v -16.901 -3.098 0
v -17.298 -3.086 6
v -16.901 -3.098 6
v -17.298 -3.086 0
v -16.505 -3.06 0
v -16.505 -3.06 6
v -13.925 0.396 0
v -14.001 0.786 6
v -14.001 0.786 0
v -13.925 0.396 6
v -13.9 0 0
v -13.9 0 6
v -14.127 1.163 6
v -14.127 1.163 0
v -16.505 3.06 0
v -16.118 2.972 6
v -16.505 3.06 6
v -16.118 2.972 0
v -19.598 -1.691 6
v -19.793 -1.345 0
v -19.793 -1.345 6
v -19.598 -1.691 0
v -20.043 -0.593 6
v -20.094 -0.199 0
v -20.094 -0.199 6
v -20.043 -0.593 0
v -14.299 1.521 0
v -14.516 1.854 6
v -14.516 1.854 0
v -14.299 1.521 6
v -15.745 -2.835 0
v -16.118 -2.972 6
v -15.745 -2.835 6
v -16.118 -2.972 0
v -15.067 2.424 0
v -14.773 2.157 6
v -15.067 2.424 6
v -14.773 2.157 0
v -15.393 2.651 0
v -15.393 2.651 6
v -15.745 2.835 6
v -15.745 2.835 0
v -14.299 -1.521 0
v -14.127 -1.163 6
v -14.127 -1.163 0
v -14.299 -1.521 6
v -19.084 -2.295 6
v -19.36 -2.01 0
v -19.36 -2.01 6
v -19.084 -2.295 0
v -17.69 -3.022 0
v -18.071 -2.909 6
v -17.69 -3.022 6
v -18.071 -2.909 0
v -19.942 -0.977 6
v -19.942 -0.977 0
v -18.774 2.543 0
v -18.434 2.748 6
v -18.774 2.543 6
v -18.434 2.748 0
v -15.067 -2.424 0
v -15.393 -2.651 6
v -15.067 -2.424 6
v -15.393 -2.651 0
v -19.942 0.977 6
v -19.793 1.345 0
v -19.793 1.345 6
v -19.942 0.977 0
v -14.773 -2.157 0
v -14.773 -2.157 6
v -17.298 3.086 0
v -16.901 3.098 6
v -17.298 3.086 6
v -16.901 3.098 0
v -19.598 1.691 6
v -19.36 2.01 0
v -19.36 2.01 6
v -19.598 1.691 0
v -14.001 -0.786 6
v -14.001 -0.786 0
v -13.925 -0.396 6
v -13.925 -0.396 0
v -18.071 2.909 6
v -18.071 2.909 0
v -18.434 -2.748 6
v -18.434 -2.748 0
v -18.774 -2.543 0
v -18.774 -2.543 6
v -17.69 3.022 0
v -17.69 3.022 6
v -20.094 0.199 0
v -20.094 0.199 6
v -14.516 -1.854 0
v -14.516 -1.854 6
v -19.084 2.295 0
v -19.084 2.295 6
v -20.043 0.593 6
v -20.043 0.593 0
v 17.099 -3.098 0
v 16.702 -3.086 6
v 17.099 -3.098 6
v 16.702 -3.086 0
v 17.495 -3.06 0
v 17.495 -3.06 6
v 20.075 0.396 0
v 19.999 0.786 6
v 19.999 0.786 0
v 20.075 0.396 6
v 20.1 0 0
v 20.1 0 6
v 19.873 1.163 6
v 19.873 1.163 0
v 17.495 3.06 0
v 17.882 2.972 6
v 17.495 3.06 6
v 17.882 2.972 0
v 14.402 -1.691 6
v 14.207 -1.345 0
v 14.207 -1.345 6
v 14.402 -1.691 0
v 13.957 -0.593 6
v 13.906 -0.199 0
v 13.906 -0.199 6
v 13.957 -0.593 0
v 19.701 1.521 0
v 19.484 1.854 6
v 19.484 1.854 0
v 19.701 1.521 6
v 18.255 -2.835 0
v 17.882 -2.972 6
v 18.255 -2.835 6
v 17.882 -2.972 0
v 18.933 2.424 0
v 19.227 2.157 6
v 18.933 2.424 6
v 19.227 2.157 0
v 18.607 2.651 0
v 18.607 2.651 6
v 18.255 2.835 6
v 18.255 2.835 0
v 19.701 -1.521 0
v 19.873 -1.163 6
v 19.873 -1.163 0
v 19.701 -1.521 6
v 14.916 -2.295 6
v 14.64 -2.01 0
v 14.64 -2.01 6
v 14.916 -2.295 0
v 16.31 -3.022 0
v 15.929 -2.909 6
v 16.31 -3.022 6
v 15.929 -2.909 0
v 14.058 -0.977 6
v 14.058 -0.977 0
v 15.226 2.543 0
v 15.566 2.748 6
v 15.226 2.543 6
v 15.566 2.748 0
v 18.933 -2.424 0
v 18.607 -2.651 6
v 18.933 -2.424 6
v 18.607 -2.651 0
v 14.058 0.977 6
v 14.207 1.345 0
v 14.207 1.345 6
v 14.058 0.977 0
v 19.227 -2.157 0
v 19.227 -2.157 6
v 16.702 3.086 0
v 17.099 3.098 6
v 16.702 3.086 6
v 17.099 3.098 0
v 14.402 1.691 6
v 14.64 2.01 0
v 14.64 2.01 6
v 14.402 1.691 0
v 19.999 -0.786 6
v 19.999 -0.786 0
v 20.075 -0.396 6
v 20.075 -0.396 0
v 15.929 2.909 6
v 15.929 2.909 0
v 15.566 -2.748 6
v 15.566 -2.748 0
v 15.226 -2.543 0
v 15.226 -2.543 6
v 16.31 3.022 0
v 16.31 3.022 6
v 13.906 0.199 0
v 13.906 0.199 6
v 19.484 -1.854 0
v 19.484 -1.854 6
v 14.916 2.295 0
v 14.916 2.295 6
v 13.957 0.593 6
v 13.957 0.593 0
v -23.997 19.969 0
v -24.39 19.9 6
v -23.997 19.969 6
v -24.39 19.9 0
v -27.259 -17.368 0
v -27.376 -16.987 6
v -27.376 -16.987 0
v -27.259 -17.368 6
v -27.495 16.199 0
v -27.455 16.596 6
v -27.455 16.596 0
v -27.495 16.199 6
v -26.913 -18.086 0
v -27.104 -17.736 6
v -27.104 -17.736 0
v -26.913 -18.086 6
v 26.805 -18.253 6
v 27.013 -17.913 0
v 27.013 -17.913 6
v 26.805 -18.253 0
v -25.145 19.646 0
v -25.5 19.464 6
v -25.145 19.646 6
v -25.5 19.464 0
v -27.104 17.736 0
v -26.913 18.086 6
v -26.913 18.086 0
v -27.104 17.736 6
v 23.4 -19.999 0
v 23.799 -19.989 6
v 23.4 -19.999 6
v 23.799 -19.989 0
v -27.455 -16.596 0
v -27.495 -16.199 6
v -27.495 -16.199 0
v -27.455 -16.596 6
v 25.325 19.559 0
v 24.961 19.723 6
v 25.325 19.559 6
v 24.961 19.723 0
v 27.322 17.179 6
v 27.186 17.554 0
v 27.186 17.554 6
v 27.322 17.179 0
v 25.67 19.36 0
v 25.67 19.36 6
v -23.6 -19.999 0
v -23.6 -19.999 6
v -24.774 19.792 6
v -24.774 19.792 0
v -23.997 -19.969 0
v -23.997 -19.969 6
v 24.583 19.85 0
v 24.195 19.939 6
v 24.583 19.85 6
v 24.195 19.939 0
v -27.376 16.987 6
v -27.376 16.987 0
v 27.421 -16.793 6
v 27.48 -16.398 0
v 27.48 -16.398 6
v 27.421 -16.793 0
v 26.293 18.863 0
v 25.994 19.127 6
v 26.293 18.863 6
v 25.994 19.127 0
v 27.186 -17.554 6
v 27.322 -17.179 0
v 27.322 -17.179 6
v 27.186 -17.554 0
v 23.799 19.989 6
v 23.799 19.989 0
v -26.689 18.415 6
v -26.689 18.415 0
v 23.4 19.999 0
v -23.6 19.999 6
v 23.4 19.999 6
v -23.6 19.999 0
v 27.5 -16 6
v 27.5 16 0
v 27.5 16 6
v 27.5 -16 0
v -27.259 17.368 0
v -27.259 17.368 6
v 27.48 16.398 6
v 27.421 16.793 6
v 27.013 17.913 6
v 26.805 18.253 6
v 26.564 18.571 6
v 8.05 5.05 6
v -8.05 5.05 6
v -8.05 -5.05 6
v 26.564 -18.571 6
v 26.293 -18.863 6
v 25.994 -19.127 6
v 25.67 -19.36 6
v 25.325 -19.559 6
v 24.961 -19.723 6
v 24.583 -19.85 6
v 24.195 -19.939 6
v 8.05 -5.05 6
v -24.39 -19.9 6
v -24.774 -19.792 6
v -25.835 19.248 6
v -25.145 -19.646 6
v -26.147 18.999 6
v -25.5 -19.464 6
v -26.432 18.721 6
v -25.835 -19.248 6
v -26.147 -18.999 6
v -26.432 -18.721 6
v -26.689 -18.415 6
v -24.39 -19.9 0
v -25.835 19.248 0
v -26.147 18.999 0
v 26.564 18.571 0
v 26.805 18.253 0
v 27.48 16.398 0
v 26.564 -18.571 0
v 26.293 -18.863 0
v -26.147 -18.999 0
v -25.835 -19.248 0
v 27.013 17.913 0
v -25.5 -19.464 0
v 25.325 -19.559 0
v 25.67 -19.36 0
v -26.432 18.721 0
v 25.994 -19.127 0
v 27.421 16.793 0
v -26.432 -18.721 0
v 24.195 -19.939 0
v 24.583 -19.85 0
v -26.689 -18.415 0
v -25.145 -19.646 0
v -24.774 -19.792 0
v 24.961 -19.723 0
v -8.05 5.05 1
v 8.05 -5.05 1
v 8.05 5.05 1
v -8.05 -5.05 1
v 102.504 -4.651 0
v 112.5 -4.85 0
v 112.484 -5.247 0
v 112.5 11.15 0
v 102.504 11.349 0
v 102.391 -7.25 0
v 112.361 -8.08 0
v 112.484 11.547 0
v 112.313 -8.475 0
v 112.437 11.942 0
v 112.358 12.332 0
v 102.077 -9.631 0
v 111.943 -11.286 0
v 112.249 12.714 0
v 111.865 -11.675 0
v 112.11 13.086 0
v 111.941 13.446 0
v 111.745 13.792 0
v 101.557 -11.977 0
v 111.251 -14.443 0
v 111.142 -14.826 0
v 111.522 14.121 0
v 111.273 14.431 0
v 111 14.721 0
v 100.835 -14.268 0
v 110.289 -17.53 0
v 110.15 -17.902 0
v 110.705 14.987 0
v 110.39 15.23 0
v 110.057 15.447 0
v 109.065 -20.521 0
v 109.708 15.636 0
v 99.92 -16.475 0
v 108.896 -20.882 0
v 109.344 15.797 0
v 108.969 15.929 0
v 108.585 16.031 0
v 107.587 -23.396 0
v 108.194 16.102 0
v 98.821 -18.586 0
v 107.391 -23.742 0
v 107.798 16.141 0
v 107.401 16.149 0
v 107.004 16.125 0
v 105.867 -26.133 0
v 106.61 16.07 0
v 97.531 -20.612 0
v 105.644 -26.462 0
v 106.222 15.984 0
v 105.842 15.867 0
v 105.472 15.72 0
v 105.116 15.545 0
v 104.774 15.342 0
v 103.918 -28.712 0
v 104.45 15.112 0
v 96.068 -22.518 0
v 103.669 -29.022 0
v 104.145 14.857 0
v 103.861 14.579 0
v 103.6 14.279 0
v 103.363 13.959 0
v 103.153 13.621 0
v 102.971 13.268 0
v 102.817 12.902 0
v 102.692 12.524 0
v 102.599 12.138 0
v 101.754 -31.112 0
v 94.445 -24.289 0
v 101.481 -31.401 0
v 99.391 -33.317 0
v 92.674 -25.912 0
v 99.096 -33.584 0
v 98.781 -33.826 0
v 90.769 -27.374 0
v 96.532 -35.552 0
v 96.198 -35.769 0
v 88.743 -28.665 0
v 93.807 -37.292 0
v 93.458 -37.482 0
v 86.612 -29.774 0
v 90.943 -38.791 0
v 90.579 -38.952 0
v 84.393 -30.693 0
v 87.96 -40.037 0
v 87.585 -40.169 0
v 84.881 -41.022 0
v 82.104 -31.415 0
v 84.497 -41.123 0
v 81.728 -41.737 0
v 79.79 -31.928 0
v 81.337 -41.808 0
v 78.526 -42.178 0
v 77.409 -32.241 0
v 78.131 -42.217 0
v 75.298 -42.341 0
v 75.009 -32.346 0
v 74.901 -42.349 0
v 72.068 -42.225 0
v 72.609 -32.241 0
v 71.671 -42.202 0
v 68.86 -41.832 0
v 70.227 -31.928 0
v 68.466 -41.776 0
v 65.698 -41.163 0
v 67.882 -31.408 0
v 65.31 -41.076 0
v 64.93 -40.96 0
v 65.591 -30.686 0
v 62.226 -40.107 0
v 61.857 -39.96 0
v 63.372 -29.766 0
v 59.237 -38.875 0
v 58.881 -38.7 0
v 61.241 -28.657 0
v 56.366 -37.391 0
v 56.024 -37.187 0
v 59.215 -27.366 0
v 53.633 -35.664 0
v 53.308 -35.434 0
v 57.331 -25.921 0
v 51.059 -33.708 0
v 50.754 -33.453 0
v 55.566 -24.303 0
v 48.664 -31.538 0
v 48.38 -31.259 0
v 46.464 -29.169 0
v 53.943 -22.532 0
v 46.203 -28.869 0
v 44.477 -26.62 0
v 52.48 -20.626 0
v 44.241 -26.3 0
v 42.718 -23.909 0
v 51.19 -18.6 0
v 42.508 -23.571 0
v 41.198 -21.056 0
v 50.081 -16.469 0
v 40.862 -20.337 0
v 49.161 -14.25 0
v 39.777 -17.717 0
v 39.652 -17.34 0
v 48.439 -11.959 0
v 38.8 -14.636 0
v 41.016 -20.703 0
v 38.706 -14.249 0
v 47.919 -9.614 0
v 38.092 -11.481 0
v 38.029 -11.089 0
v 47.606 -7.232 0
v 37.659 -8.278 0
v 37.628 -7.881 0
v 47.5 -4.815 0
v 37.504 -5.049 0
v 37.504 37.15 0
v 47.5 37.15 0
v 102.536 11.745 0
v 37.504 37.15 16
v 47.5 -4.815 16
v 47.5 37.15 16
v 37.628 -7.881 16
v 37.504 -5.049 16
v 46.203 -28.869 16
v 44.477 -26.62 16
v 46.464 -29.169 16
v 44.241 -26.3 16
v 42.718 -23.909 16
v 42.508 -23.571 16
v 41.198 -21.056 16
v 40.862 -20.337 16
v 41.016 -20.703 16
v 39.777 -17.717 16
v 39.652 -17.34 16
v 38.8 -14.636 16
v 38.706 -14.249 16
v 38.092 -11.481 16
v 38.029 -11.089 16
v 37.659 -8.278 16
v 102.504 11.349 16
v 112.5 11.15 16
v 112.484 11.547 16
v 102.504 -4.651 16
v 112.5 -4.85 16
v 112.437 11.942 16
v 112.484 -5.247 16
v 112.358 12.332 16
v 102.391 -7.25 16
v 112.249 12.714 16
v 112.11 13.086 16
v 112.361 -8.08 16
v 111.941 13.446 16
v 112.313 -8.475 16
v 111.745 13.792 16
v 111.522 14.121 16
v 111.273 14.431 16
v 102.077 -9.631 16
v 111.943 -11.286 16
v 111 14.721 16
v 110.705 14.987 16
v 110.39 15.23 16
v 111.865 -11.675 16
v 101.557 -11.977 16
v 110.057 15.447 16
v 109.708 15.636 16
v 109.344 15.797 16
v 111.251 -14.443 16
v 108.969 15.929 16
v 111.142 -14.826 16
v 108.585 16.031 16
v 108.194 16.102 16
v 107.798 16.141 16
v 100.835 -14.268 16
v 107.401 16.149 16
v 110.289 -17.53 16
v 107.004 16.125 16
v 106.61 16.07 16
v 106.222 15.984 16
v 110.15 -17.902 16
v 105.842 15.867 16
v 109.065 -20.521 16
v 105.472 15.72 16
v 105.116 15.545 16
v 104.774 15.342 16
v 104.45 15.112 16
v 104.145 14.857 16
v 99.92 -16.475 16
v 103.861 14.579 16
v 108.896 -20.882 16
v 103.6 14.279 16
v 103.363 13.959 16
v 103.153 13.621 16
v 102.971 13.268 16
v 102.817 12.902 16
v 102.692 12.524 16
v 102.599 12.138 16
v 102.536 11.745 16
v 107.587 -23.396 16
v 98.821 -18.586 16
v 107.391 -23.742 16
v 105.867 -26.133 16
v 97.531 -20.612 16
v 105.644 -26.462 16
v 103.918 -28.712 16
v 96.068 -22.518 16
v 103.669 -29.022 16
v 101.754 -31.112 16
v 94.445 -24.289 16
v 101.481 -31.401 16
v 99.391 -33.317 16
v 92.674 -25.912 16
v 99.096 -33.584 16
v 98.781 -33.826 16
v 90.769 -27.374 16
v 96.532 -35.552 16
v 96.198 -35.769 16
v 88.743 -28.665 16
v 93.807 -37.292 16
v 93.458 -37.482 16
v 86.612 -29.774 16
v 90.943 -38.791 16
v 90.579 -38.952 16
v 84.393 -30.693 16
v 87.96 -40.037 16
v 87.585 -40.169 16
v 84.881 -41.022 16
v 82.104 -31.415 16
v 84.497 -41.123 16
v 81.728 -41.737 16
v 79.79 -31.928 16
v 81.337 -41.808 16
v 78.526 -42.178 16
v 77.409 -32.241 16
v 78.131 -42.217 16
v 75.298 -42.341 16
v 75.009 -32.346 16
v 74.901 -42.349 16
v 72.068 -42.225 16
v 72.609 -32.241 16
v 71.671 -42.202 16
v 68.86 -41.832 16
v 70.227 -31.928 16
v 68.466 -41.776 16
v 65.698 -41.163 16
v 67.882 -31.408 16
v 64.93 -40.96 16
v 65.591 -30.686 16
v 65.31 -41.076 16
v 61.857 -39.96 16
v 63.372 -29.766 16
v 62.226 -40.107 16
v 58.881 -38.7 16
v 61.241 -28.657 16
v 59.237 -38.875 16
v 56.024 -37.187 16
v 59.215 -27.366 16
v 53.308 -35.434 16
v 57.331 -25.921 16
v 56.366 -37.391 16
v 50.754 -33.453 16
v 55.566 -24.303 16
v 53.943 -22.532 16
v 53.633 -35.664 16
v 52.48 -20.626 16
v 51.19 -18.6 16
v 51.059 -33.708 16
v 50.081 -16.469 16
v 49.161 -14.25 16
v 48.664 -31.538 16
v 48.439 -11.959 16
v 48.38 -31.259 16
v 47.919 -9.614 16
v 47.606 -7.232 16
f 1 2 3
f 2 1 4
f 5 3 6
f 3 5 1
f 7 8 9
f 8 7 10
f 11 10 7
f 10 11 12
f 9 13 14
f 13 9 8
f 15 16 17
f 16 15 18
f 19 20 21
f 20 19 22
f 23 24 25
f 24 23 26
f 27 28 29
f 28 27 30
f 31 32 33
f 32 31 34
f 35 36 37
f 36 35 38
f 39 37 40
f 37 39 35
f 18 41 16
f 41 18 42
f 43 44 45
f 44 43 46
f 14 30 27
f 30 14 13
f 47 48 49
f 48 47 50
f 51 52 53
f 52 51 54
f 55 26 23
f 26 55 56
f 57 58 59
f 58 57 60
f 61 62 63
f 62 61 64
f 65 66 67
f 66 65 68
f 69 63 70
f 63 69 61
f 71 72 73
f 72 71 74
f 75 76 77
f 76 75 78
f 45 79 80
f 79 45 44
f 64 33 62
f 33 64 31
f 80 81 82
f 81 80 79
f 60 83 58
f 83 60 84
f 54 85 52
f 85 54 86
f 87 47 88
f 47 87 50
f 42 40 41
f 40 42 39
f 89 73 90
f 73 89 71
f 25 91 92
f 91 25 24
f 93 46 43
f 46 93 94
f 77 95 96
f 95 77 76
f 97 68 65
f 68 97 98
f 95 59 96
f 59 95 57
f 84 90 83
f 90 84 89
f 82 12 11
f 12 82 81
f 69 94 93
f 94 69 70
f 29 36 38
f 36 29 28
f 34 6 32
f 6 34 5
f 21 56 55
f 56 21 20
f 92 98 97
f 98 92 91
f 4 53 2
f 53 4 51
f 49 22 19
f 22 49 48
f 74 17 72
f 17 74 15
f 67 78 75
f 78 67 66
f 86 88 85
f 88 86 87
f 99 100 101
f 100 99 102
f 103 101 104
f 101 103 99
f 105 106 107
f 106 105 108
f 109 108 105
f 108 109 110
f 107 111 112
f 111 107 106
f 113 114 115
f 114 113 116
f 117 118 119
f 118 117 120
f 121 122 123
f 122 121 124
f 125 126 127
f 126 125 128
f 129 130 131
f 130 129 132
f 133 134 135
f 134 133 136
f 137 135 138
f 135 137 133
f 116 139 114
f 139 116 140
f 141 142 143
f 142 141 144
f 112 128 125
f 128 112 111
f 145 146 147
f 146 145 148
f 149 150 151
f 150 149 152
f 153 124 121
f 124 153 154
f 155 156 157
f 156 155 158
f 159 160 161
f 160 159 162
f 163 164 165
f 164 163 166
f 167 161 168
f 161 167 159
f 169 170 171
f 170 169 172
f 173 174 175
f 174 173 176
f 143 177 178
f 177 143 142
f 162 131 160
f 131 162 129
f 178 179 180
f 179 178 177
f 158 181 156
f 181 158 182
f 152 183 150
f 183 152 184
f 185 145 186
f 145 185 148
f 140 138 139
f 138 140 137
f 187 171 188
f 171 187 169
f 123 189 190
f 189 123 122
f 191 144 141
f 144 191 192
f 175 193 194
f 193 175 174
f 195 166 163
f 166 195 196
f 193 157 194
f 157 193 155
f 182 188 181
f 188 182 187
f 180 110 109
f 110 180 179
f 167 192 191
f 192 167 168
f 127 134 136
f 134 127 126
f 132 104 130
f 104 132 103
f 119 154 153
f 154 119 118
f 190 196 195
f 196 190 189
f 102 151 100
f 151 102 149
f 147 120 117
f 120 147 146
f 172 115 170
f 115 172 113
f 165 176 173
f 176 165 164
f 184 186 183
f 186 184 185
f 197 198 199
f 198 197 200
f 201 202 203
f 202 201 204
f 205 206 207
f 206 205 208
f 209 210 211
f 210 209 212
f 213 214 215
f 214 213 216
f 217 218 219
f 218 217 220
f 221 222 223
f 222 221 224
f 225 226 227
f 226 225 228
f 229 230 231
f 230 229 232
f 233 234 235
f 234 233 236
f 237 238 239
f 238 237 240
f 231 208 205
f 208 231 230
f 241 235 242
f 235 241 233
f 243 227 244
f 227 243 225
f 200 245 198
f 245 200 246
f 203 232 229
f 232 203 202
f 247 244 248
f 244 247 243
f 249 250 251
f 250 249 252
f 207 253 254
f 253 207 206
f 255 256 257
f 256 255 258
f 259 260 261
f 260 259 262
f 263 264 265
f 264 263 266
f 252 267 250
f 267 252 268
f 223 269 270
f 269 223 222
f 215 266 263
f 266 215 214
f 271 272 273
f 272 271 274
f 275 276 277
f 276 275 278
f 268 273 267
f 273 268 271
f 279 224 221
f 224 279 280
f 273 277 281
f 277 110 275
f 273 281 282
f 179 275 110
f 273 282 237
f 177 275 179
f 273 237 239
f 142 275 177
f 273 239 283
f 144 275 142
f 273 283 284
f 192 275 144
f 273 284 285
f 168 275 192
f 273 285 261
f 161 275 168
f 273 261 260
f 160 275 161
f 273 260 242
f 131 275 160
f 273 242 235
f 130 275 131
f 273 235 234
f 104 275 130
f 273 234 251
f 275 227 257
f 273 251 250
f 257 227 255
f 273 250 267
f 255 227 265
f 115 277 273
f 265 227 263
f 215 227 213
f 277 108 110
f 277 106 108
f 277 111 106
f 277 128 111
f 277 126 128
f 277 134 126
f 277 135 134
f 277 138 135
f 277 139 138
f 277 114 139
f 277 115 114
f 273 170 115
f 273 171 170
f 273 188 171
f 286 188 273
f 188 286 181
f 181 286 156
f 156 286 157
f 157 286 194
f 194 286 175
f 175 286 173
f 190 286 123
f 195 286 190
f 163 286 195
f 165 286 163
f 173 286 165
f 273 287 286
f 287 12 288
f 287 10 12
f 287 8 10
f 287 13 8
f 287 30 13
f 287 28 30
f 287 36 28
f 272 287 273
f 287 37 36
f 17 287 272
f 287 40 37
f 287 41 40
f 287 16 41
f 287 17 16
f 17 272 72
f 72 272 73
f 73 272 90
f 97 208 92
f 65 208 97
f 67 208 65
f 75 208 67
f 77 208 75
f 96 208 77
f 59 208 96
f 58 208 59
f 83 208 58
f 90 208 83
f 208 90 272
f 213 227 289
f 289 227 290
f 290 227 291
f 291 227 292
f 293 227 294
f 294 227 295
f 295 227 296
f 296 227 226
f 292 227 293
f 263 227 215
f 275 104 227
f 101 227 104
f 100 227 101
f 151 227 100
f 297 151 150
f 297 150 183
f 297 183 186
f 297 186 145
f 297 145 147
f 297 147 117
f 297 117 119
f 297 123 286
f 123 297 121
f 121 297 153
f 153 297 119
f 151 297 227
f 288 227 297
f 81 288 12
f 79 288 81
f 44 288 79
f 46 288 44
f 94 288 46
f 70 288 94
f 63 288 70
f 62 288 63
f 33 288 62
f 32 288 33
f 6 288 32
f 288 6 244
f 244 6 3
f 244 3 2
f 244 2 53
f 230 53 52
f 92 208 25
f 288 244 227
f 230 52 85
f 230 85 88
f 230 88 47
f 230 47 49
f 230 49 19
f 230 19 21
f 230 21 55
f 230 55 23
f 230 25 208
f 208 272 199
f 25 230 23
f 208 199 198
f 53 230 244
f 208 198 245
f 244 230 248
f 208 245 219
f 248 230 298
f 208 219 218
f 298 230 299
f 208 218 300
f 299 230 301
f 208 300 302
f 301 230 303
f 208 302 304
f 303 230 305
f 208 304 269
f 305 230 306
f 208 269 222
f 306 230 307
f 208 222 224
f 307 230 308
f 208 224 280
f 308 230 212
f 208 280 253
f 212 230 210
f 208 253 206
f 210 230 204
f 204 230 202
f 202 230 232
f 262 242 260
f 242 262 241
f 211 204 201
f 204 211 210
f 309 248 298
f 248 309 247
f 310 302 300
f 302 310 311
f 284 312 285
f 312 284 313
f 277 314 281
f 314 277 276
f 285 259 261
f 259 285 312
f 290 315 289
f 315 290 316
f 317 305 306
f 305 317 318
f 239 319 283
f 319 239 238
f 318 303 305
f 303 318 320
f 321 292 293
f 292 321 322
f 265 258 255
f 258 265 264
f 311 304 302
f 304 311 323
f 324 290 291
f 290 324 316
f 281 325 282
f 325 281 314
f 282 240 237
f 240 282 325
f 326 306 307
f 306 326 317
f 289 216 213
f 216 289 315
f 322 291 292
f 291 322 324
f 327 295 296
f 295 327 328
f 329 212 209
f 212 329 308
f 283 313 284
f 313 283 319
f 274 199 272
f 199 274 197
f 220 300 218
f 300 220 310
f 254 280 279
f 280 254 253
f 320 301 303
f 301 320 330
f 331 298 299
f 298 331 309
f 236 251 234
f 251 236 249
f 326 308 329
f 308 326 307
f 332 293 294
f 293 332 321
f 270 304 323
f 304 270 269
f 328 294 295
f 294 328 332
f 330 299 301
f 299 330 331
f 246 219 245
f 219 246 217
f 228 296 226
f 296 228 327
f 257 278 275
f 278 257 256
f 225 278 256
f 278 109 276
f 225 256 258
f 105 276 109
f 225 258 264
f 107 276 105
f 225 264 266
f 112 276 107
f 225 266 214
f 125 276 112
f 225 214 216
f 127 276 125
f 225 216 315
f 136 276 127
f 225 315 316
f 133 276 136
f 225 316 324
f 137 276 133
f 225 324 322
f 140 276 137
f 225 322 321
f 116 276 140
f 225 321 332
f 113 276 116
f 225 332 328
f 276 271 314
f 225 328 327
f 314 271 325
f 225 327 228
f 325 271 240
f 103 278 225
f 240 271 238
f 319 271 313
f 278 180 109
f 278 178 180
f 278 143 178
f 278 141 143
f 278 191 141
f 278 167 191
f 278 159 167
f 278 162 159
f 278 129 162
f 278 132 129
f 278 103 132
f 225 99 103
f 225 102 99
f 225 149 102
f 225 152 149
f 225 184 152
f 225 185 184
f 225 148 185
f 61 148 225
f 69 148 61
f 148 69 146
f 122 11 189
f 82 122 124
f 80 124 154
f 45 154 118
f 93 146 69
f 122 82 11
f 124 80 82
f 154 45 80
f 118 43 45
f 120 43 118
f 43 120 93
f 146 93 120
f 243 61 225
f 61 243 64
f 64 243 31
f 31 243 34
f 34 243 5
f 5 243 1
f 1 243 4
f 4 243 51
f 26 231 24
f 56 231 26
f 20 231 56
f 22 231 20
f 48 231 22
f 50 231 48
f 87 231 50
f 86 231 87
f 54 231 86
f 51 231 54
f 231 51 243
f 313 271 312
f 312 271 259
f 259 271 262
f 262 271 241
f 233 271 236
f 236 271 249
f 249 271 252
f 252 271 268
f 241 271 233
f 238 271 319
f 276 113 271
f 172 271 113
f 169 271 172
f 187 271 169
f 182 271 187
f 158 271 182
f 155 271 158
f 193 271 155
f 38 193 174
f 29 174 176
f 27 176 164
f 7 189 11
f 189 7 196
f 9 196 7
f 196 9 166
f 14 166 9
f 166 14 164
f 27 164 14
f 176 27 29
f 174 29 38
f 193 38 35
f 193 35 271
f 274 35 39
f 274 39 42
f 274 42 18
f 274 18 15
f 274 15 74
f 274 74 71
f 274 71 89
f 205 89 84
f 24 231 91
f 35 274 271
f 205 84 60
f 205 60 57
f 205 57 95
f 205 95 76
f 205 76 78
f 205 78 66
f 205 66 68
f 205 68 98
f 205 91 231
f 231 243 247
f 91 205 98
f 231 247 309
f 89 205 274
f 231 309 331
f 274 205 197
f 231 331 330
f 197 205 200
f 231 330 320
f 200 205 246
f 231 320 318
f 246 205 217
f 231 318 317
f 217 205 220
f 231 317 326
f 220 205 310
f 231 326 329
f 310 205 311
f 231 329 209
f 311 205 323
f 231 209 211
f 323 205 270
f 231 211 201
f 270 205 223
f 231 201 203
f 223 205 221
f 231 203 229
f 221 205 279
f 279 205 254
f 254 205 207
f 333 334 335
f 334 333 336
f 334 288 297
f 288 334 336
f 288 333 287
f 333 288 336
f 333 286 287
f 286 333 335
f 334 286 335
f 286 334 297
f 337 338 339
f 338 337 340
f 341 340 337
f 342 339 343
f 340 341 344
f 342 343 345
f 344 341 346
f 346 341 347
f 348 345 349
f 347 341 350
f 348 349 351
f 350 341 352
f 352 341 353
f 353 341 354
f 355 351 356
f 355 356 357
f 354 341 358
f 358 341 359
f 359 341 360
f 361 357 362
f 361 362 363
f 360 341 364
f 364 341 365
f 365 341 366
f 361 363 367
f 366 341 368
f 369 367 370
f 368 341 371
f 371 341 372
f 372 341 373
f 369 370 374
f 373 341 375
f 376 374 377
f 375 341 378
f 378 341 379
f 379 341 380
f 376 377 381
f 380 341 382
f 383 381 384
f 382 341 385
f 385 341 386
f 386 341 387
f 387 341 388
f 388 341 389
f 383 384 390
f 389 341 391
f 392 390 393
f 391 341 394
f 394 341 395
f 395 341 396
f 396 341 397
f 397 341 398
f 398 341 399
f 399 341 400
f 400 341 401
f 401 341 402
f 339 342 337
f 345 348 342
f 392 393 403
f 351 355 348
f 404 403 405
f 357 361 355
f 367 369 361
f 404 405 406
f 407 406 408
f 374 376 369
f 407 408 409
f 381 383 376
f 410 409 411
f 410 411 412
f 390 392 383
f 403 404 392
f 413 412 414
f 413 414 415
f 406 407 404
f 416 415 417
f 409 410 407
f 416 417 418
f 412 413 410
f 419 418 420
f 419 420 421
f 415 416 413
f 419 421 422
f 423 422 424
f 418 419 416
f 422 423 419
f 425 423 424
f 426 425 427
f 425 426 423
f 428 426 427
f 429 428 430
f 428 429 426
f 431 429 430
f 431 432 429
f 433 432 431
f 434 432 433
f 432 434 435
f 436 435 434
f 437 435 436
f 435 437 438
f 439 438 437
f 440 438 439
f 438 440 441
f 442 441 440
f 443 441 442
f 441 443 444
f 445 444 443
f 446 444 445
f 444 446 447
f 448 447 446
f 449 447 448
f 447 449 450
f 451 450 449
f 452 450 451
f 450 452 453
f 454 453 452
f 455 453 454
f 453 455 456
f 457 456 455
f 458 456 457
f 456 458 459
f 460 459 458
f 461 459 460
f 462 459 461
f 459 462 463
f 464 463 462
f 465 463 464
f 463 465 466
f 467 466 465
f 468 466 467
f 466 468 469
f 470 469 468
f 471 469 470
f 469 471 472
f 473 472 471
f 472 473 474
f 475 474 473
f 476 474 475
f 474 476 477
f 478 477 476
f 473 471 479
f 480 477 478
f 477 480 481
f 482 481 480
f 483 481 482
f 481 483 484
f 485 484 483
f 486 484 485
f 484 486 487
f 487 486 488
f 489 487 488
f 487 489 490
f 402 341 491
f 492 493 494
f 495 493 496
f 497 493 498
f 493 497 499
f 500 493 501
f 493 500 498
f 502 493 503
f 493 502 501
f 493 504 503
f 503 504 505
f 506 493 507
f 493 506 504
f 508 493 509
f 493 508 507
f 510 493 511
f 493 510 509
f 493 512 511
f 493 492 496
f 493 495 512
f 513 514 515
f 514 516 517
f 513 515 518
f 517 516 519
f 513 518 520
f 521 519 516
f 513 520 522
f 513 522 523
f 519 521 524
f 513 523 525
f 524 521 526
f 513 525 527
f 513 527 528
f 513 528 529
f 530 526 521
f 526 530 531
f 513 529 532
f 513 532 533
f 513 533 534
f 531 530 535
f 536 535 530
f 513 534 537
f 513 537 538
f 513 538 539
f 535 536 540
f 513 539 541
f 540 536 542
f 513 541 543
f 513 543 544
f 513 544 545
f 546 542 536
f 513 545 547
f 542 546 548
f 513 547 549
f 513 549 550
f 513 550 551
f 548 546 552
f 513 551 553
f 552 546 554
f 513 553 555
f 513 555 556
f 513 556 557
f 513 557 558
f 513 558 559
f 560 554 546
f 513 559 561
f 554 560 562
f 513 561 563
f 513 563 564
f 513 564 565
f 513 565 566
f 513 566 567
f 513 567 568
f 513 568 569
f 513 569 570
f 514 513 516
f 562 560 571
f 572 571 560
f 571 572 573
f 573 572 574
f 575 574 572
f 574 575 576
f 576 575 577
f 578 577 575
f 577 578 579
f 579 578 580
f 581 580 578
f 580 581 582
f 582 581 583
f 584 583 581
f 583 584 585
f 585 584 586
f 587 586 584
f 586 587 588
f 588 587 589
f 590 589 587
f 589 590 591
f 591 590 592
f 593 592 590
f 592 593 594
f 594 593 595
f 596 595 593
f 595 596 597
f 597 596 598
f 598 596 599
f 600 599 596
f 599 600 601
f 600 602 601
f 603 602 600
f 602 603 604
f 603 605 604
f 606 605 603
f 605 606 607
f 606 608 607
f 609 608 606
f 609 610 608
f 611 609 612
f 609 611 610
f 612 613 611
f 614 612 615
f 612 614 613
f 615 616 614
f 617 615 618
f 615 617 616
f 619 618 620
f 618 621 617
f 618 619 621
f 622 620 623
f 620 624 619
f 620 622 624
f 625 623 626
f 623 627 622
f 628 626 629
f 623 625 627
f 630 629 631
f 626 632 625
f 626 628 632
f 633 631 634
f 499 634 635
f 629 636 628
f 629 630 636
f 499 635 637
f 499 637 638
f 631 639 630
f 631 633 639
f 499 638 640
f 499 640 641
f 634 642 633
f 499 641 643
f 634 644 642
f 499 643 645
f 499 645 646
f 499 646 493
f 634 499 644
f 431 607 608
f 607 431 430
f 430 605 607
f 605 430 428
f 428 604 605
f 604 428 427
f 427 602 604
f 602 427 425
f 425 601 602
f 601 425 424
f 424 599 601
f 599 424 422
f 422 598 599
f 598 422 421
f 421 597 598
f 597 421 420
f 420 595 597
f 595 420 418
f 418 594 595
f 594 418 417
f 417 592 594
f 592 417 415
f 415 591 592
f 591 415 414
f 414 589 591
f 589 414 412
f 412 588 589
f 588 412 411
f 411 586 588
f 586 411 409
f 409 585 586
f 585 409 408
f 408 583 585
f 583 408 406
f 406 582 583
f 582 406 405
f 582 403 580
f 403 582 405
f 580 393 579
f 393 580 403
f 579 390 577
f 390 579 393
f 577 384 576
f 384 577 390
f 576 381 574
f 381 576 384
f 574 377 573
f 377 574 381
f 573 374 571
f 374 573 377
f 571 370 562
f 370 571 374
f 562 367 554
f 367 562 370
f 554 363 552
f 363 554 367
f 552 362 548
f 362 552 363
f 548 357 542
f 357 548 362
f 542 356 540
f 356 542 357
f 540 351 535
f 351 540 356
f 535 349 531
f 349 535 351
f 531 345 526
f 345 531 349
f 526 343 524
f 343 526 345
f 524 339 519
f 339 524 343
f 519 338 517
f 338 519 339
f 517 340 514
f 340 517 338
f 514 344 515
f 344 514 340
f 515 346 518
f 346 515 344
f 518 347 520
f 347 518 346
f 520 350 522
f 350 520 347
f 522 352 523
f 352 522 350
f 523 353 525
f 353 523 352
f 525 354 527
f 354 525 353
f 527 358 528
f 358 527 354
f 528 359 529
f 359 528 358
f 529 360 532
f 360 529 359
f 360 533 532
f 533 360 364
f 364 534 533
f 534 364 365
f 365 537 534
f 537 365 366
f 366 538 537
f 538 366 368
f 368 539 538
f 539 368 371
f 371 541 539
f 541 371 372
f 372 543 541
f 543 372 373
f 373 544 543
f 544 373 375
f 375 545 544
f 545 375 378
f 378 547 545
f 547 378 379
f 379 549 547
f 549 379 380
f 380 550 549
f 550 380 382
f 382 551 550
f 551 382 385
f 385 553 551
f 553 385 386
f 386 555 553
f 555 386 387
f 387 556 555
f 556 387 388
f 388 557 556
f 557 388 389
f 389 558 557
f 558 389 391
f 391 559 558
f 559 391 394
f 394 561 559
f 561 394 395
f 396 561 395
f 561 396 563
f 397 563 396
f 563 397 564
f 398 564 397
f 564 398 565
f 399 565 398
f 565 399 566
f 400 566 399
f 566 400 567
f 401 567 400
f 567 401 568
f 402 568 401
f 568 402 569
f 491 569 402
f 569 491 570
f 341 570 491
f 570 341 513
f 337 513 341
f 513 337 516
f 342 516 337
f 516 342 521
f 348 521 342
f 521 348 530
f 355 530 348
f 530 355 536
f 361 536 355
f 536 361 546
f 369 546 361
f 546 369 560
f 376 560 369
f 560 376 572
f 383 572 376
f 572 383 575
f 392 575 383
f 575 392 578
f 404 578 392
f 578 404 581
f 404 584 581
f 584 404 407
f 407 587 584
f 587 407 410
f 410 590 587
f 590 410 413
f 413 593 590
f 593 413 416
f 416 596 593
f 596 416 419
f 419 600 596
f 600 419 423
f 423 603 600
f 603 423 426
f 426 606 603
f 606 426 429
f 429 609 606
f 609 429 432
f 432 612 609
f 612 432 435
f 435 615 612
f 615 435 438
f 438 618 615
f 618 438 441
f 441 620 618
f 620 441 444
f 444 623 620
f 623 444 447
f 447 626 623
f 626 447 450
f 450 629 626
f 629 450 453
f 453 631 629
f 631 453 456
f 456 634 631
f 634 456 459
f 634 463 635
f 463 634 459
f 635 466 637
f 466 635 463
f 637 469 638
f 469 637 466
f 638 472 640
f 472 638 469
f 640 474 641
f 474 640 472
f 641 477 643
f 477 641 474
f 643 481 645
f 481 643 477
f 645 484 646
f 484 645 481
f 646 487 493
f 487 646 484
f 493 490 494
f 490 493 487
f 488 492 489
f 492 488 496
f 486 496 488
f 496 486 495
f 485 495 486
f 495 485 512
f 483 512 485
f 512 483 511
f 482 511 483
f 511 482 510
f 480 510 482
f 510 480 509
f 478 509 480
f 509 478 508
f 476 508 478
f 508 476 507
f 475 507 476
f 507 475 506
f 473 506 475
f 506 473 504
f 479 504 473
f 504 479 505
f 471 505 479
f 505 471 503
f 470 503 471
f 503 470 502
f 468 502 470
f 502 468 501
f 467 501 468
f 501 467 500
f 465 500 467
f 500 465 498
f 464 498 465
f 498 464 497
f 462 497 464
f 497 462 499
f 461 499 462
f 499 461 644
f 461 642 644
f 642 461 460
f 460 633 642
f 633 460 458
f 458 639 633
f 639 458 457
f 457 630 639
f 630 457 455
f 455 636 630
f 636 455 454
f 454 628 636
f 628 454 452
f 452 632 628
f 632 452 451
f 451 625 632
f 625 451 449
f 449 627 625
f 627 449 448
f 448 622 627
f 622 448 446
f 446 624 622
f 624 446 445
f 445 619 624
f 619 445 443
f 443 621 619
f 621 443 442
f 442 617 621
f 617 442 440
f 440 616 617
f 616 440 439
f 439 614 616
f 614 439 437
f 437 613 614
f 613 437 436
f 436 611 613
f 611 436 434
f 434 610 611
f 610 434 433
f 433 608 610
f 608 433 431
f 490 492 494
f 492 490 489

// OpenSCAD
// ============================================================
// Garage Hook — Underside-Beam J-Hook (Split for Printing)
//
// A classic J-hook that screws into the underside of a wooden
// beam (e.g. 2×3 nominal, ~40 mm face).  Two pan-head self-
// tapping screws go through the base plate into the wood.
// Lightweight garage items hang on the deep J curve.
//
// The model is split into two glue-together parts so both
// print support-free:
//   BASE  — plate with a socket pocket; prints flat on the bed.
//   HOOK  — J-curve with a tenon; prints on its side.
//
// Coordinate system:
//   X = along the beam (base plate length direction)
//   Y = across the beam width (hook width direction)
//   Z = down from the beam underside (positive = downward)
//
// All units: millimeters.
// ============================================================

/* [Hook Shape] */
straight_down          = 42;    // Vertical back section length
arc_radius             = 32.5;    // Centerline radius of the 180° bottom curve
straight_up            = 16;    // Vertical front lip length (tip sits 10 mm below base)
band_thickness         = 10;    // Hook body thickness in profile plane
hook_width             = 16;    // Hook body width along Y (across beam)
arc_steps              = 36;    // Number of segments for the bottom curve

/* [Mounting Plate] */
plate_length           = 55;    // X — along the beam
plate_width            = 40;    // Y — across the beam (matches ~40 mm beam face)
plate_thickness        = 6;     // Z — plate height

/* [Screw Holes] */
screw_diameter         = 6.2;   // Clearance for 5 mm self-tapping screws
screw_spacing          = 34;    // Center-to-center along X
hole_overage           = 0.4;   // Extra drill-through beyond plate thickness

/* [Split Joint] */
socket_depth           = 5;     // Depth of the socket pocket in the base plate
socket_clearance       = 0.05;  // Radial clearance for glue (per side)
socket_bottom_gap      = 0.2;   // Extra socket depth so the tenon tip clears
print_spacing          = 10;    // Minimum gap between parts on the print bed

/* [Reinforcement] */
root_fillet_radius     = 5;     // Fillet radius at the hook-back-to-plate junction

/* [View] */
export_mode            = "print"; // assembly | print | base | hook

/* [Quality] */
$fa                    = 1;
$fs                    = 0.4;

// ============================================================
// DERIVED
// ============================================================

band_radius            = band_thickness / 2;
half_hook_width        = hook_width / 2;
half_plate_length      = plate_length / 2;
half_plate_width       = plate_width / 2;

// Arc geometry — 180° sweep clockwise from left (180°) through
// bottom (270°) to right (360° ≡ 0°).
arc_center             = [arc_radius, -straight_down];
arc_start_angle        = 180;
arc_end_angle          = 360;

// Key profile points
tip_z                  = -straight_down + straight_up;  // ~ -10
front_x                = 2 * arc_radius;                 // 42 — X of the front lip

// Screw positions on the plate (XZ plane, plate sits at Z=0)
screw_half_spacing     = screw_spacing / 2;

// Socket / tenon derived dimensions (square, no corner rounding)
socket_w               = band_thickness + 2 * socket_clearance;
socket_d               = hook_width     + 2 * socket_clearance;

// Print-layout placement helpers (offsets from the base origin)
// Hook profile X span ≈ band_radius … (front_x + band_radius)  →  −5 … 70
hook_print_x           = half_plate_length + print_spacing + band_radius;
// Hook Y span after rotation ≈ −(socket_depth+socket_bottom_gap) … (straight_down+arc_radius+band_radius)
hook_print_y           = (straight_down + arc_radius + band_radius
                           - socket_depth - socket_bottom_gap) / 2;

// ============================================================
// HELPERS
// ============================================================

module rounded_rect_2d(w, h, r) {
    corner_r = min(r, w / 2 - 0.01, h / 2 - 0.01);
    hull() {
        translate([ w / 2 - corner_r,  h / 2 - corner_r]) circle(r = corner_r);
        translate([-w / 2 + corner_r,  h / 2 - corner_r]) circle(r = corner_r);
        translate([ w / 2 - corner_r, -h / 2 + corner_r]) circle(r = corner_r);
        translate([-w / 2 + corner_r, -h / 2 + corner_r]) circle(r = corner_r);
    }
}

module circle_segment_2d(p0, p1, r) {
    hull() {
        translate(p0) circle(r = r);
        translate(p1) circle(r = r);
    }
}

function arc_point(angle) = [
    arc_center[0] + arc_radius * cos(angle),
    arc_center[1] + arc_radius * sin(angle)
];

// ============================================================
// 2D HOOK PROFILE
// ============================================================

// The J-hook profile lies in the XZ plane.
// Path: straight back down → 180° bottom arc → straight front up.
module hook_profile_2d() {
    union() {
        // Straight back: (0, 0) down to (0, -straight_down)
        circle_segment_2d([0, 0], [0, -straight_down], band_radius);

        // 180° bottom arc: sweeps clockwise through the bottom
        for (i = [0 : arc_steps - 1]) {
            a0 = arc_start_angle + (arc_end_angle - arc_start_angle) * i / arc_steps;
            a1 = arc_start_angle + (arc_end_angle - arc_start_angle) * (i + 1) / arc_steps;
            circle_segment_2d(arc_point(a0), arc_point(a1), band_radius);
        }

        // Straight front: (front_x, -straight_down) up to (front_x, tip_z)
        circle_segment_2d([front_x, -straight_down], [front_x, tip_z], band_radius);
    }
}

// ============================================================
// 3D GEOMETRY
// ============================================================

// The hook body — 2D profile stood up so the J hangs vertically.
// rotate([-90,0,0]) maps the 2D Y (down-in-profile) → 3D Z (down),
// and the linear_extrude Z → 3D Y (hook width across the beam).
module hook_body_3d() {
    rotate([-90, 0, 0])
        linear_extrude(height = hook_width, center = true, convexity = 10)
            hook_profile_2d();
}

// The base plate — rectangular with rounded corners
module mounting_plate_3d() {
    plate_corner_r = 4;
    translate([0, 0, plate_thickness / 2])
        linear_extrude(height = plate_thickness, center = true)
            rounded_rect_2d(plate_length, plate_width, plate_corner_r);
}

// Screw holes — two straight clearance holes through the plate
module screw_holes_3d() {
    total_depth = plate_thickness + hole_overage;

    for (sx = [-1, 1]) {
        translate([sx * screw_half_spacing, 0, plate_thickness / 2])
            cylinder(h = total_depth, d = screw_diameter, center = true);
    }
}

// ============================================================
// SPLIT JOINT — Tenon & Socket
// ============================================================

// Tenon extending from the hook's attachment plane toward the plate.
// In hook-local coordinates the attachment plane is at Z = 0 and the
// tenon points in the −Z direction (upward into the plate socket).
// Square cross-section — no rounding.  Dimensions are swapped vs.
// the natural hook cross-section to match the 90°-rotated socket.
module hook_tenon_3d() {
    tenon_h = socket_depth + socket_bottom_gap;
    translate([0, 0, -tenon_h])
        linear_extrude(height = tenon_h)
            square([hook_width, band_thickness], center = true);
}

// Socket pocket cut into the bottom face of the mounting plate.
// The plate bottom face is at Z = plate_thickness; we carve upward.
// Square pocket — no corner rounding.
module socket_cut() {
    socket_h = socket_depth + socket_bottom_gap + 0.01;
    rotate([0, 0, 90])
        translate([0, 0, plate_thickness - socket_depth])
            linear_extrude(height = socket_h)
                square([socket_w, socket_d], center = true);
}

// ============================================================
// BASE PART — Plate with socket
// ============================================================

module garage_hook_base_assembly() {
    difference() {
        mounting_plate_3d();
        socket_cut();
        screw_holes_3d();
    }
}

module garage_hook_base_print() {
    // Plate already lies flat in assembly orientation:
    // beam-contact face at Z = 0 (on bed), socket facing up.
    garage_hook_base_assembly();
}

// ============================================================
// HOOK PART — J-hook with tenon
// ============================================================

module hook_with_tenon() {
    union() {
        // Hook body truncated flat at the attachment plane (Z = 0)
        // so it presents a clean mating face against the base plate.
        intersection() {
            hook_body_3d();
            translate([0, 0, 50])
                cube([200, 200, 100], center = true);
        }
    }
}

module garage_hook_hook_assembly() {
    // Position the hook below the plate in installed orientation.
    translate([0, 0, plate_thickness])
        hook_with_tenon();
}

module garage_hook_hook_print() {
    // Lay the hook on its side — profile flat on the bed,
    // hook width becomes the vertical height.
    translate([0, 0, hook_width / 2])
        rotate([90, 0, 0])
            hook_with_tenon();
}

// ============================================================
// ASSEMBLY VIEW — Both parts fitted together
// ============================================================

module garage_hook_assembly_view() {
    // Base in installed orientation (plate on top, socket down)
    color([0.93, 0.42, 0.18])
        garage_hook_base_assembly();

    // Hook inserted from below
    color([0.93, 0.42, 0.18])
        garage_hook_hook_assembly();
}

// ============================================================
// PRINT LAYOUT — Both parts on the bed
// ============================================================

module garage_hook_print_layout() {
    // ----- Base -----
    // Base at origin, beam-contact face on bed, socket up.
    garage_hook_base_print();

    // ----- Hook -----
    // Hook laid on its side, offset to the right of the base.
    // hook_print_x / hook_print_y are pre-computed in DERIVED.
    translate([hook_print_x, hook_print_y, 0])
        garage_hook_hook_print();
}

// ============================================================
// EXPORT
// ============================================================

if (export_mode == "base") {
    garage_hook_base_print();
} else if (export_mode == "hook") {
    garage_hook_hook_print();
} else if (export_mode == "print") {
    garage_hook_print_layout();
} else { // "assembly"
    garage_hook_assembly_view();
}
